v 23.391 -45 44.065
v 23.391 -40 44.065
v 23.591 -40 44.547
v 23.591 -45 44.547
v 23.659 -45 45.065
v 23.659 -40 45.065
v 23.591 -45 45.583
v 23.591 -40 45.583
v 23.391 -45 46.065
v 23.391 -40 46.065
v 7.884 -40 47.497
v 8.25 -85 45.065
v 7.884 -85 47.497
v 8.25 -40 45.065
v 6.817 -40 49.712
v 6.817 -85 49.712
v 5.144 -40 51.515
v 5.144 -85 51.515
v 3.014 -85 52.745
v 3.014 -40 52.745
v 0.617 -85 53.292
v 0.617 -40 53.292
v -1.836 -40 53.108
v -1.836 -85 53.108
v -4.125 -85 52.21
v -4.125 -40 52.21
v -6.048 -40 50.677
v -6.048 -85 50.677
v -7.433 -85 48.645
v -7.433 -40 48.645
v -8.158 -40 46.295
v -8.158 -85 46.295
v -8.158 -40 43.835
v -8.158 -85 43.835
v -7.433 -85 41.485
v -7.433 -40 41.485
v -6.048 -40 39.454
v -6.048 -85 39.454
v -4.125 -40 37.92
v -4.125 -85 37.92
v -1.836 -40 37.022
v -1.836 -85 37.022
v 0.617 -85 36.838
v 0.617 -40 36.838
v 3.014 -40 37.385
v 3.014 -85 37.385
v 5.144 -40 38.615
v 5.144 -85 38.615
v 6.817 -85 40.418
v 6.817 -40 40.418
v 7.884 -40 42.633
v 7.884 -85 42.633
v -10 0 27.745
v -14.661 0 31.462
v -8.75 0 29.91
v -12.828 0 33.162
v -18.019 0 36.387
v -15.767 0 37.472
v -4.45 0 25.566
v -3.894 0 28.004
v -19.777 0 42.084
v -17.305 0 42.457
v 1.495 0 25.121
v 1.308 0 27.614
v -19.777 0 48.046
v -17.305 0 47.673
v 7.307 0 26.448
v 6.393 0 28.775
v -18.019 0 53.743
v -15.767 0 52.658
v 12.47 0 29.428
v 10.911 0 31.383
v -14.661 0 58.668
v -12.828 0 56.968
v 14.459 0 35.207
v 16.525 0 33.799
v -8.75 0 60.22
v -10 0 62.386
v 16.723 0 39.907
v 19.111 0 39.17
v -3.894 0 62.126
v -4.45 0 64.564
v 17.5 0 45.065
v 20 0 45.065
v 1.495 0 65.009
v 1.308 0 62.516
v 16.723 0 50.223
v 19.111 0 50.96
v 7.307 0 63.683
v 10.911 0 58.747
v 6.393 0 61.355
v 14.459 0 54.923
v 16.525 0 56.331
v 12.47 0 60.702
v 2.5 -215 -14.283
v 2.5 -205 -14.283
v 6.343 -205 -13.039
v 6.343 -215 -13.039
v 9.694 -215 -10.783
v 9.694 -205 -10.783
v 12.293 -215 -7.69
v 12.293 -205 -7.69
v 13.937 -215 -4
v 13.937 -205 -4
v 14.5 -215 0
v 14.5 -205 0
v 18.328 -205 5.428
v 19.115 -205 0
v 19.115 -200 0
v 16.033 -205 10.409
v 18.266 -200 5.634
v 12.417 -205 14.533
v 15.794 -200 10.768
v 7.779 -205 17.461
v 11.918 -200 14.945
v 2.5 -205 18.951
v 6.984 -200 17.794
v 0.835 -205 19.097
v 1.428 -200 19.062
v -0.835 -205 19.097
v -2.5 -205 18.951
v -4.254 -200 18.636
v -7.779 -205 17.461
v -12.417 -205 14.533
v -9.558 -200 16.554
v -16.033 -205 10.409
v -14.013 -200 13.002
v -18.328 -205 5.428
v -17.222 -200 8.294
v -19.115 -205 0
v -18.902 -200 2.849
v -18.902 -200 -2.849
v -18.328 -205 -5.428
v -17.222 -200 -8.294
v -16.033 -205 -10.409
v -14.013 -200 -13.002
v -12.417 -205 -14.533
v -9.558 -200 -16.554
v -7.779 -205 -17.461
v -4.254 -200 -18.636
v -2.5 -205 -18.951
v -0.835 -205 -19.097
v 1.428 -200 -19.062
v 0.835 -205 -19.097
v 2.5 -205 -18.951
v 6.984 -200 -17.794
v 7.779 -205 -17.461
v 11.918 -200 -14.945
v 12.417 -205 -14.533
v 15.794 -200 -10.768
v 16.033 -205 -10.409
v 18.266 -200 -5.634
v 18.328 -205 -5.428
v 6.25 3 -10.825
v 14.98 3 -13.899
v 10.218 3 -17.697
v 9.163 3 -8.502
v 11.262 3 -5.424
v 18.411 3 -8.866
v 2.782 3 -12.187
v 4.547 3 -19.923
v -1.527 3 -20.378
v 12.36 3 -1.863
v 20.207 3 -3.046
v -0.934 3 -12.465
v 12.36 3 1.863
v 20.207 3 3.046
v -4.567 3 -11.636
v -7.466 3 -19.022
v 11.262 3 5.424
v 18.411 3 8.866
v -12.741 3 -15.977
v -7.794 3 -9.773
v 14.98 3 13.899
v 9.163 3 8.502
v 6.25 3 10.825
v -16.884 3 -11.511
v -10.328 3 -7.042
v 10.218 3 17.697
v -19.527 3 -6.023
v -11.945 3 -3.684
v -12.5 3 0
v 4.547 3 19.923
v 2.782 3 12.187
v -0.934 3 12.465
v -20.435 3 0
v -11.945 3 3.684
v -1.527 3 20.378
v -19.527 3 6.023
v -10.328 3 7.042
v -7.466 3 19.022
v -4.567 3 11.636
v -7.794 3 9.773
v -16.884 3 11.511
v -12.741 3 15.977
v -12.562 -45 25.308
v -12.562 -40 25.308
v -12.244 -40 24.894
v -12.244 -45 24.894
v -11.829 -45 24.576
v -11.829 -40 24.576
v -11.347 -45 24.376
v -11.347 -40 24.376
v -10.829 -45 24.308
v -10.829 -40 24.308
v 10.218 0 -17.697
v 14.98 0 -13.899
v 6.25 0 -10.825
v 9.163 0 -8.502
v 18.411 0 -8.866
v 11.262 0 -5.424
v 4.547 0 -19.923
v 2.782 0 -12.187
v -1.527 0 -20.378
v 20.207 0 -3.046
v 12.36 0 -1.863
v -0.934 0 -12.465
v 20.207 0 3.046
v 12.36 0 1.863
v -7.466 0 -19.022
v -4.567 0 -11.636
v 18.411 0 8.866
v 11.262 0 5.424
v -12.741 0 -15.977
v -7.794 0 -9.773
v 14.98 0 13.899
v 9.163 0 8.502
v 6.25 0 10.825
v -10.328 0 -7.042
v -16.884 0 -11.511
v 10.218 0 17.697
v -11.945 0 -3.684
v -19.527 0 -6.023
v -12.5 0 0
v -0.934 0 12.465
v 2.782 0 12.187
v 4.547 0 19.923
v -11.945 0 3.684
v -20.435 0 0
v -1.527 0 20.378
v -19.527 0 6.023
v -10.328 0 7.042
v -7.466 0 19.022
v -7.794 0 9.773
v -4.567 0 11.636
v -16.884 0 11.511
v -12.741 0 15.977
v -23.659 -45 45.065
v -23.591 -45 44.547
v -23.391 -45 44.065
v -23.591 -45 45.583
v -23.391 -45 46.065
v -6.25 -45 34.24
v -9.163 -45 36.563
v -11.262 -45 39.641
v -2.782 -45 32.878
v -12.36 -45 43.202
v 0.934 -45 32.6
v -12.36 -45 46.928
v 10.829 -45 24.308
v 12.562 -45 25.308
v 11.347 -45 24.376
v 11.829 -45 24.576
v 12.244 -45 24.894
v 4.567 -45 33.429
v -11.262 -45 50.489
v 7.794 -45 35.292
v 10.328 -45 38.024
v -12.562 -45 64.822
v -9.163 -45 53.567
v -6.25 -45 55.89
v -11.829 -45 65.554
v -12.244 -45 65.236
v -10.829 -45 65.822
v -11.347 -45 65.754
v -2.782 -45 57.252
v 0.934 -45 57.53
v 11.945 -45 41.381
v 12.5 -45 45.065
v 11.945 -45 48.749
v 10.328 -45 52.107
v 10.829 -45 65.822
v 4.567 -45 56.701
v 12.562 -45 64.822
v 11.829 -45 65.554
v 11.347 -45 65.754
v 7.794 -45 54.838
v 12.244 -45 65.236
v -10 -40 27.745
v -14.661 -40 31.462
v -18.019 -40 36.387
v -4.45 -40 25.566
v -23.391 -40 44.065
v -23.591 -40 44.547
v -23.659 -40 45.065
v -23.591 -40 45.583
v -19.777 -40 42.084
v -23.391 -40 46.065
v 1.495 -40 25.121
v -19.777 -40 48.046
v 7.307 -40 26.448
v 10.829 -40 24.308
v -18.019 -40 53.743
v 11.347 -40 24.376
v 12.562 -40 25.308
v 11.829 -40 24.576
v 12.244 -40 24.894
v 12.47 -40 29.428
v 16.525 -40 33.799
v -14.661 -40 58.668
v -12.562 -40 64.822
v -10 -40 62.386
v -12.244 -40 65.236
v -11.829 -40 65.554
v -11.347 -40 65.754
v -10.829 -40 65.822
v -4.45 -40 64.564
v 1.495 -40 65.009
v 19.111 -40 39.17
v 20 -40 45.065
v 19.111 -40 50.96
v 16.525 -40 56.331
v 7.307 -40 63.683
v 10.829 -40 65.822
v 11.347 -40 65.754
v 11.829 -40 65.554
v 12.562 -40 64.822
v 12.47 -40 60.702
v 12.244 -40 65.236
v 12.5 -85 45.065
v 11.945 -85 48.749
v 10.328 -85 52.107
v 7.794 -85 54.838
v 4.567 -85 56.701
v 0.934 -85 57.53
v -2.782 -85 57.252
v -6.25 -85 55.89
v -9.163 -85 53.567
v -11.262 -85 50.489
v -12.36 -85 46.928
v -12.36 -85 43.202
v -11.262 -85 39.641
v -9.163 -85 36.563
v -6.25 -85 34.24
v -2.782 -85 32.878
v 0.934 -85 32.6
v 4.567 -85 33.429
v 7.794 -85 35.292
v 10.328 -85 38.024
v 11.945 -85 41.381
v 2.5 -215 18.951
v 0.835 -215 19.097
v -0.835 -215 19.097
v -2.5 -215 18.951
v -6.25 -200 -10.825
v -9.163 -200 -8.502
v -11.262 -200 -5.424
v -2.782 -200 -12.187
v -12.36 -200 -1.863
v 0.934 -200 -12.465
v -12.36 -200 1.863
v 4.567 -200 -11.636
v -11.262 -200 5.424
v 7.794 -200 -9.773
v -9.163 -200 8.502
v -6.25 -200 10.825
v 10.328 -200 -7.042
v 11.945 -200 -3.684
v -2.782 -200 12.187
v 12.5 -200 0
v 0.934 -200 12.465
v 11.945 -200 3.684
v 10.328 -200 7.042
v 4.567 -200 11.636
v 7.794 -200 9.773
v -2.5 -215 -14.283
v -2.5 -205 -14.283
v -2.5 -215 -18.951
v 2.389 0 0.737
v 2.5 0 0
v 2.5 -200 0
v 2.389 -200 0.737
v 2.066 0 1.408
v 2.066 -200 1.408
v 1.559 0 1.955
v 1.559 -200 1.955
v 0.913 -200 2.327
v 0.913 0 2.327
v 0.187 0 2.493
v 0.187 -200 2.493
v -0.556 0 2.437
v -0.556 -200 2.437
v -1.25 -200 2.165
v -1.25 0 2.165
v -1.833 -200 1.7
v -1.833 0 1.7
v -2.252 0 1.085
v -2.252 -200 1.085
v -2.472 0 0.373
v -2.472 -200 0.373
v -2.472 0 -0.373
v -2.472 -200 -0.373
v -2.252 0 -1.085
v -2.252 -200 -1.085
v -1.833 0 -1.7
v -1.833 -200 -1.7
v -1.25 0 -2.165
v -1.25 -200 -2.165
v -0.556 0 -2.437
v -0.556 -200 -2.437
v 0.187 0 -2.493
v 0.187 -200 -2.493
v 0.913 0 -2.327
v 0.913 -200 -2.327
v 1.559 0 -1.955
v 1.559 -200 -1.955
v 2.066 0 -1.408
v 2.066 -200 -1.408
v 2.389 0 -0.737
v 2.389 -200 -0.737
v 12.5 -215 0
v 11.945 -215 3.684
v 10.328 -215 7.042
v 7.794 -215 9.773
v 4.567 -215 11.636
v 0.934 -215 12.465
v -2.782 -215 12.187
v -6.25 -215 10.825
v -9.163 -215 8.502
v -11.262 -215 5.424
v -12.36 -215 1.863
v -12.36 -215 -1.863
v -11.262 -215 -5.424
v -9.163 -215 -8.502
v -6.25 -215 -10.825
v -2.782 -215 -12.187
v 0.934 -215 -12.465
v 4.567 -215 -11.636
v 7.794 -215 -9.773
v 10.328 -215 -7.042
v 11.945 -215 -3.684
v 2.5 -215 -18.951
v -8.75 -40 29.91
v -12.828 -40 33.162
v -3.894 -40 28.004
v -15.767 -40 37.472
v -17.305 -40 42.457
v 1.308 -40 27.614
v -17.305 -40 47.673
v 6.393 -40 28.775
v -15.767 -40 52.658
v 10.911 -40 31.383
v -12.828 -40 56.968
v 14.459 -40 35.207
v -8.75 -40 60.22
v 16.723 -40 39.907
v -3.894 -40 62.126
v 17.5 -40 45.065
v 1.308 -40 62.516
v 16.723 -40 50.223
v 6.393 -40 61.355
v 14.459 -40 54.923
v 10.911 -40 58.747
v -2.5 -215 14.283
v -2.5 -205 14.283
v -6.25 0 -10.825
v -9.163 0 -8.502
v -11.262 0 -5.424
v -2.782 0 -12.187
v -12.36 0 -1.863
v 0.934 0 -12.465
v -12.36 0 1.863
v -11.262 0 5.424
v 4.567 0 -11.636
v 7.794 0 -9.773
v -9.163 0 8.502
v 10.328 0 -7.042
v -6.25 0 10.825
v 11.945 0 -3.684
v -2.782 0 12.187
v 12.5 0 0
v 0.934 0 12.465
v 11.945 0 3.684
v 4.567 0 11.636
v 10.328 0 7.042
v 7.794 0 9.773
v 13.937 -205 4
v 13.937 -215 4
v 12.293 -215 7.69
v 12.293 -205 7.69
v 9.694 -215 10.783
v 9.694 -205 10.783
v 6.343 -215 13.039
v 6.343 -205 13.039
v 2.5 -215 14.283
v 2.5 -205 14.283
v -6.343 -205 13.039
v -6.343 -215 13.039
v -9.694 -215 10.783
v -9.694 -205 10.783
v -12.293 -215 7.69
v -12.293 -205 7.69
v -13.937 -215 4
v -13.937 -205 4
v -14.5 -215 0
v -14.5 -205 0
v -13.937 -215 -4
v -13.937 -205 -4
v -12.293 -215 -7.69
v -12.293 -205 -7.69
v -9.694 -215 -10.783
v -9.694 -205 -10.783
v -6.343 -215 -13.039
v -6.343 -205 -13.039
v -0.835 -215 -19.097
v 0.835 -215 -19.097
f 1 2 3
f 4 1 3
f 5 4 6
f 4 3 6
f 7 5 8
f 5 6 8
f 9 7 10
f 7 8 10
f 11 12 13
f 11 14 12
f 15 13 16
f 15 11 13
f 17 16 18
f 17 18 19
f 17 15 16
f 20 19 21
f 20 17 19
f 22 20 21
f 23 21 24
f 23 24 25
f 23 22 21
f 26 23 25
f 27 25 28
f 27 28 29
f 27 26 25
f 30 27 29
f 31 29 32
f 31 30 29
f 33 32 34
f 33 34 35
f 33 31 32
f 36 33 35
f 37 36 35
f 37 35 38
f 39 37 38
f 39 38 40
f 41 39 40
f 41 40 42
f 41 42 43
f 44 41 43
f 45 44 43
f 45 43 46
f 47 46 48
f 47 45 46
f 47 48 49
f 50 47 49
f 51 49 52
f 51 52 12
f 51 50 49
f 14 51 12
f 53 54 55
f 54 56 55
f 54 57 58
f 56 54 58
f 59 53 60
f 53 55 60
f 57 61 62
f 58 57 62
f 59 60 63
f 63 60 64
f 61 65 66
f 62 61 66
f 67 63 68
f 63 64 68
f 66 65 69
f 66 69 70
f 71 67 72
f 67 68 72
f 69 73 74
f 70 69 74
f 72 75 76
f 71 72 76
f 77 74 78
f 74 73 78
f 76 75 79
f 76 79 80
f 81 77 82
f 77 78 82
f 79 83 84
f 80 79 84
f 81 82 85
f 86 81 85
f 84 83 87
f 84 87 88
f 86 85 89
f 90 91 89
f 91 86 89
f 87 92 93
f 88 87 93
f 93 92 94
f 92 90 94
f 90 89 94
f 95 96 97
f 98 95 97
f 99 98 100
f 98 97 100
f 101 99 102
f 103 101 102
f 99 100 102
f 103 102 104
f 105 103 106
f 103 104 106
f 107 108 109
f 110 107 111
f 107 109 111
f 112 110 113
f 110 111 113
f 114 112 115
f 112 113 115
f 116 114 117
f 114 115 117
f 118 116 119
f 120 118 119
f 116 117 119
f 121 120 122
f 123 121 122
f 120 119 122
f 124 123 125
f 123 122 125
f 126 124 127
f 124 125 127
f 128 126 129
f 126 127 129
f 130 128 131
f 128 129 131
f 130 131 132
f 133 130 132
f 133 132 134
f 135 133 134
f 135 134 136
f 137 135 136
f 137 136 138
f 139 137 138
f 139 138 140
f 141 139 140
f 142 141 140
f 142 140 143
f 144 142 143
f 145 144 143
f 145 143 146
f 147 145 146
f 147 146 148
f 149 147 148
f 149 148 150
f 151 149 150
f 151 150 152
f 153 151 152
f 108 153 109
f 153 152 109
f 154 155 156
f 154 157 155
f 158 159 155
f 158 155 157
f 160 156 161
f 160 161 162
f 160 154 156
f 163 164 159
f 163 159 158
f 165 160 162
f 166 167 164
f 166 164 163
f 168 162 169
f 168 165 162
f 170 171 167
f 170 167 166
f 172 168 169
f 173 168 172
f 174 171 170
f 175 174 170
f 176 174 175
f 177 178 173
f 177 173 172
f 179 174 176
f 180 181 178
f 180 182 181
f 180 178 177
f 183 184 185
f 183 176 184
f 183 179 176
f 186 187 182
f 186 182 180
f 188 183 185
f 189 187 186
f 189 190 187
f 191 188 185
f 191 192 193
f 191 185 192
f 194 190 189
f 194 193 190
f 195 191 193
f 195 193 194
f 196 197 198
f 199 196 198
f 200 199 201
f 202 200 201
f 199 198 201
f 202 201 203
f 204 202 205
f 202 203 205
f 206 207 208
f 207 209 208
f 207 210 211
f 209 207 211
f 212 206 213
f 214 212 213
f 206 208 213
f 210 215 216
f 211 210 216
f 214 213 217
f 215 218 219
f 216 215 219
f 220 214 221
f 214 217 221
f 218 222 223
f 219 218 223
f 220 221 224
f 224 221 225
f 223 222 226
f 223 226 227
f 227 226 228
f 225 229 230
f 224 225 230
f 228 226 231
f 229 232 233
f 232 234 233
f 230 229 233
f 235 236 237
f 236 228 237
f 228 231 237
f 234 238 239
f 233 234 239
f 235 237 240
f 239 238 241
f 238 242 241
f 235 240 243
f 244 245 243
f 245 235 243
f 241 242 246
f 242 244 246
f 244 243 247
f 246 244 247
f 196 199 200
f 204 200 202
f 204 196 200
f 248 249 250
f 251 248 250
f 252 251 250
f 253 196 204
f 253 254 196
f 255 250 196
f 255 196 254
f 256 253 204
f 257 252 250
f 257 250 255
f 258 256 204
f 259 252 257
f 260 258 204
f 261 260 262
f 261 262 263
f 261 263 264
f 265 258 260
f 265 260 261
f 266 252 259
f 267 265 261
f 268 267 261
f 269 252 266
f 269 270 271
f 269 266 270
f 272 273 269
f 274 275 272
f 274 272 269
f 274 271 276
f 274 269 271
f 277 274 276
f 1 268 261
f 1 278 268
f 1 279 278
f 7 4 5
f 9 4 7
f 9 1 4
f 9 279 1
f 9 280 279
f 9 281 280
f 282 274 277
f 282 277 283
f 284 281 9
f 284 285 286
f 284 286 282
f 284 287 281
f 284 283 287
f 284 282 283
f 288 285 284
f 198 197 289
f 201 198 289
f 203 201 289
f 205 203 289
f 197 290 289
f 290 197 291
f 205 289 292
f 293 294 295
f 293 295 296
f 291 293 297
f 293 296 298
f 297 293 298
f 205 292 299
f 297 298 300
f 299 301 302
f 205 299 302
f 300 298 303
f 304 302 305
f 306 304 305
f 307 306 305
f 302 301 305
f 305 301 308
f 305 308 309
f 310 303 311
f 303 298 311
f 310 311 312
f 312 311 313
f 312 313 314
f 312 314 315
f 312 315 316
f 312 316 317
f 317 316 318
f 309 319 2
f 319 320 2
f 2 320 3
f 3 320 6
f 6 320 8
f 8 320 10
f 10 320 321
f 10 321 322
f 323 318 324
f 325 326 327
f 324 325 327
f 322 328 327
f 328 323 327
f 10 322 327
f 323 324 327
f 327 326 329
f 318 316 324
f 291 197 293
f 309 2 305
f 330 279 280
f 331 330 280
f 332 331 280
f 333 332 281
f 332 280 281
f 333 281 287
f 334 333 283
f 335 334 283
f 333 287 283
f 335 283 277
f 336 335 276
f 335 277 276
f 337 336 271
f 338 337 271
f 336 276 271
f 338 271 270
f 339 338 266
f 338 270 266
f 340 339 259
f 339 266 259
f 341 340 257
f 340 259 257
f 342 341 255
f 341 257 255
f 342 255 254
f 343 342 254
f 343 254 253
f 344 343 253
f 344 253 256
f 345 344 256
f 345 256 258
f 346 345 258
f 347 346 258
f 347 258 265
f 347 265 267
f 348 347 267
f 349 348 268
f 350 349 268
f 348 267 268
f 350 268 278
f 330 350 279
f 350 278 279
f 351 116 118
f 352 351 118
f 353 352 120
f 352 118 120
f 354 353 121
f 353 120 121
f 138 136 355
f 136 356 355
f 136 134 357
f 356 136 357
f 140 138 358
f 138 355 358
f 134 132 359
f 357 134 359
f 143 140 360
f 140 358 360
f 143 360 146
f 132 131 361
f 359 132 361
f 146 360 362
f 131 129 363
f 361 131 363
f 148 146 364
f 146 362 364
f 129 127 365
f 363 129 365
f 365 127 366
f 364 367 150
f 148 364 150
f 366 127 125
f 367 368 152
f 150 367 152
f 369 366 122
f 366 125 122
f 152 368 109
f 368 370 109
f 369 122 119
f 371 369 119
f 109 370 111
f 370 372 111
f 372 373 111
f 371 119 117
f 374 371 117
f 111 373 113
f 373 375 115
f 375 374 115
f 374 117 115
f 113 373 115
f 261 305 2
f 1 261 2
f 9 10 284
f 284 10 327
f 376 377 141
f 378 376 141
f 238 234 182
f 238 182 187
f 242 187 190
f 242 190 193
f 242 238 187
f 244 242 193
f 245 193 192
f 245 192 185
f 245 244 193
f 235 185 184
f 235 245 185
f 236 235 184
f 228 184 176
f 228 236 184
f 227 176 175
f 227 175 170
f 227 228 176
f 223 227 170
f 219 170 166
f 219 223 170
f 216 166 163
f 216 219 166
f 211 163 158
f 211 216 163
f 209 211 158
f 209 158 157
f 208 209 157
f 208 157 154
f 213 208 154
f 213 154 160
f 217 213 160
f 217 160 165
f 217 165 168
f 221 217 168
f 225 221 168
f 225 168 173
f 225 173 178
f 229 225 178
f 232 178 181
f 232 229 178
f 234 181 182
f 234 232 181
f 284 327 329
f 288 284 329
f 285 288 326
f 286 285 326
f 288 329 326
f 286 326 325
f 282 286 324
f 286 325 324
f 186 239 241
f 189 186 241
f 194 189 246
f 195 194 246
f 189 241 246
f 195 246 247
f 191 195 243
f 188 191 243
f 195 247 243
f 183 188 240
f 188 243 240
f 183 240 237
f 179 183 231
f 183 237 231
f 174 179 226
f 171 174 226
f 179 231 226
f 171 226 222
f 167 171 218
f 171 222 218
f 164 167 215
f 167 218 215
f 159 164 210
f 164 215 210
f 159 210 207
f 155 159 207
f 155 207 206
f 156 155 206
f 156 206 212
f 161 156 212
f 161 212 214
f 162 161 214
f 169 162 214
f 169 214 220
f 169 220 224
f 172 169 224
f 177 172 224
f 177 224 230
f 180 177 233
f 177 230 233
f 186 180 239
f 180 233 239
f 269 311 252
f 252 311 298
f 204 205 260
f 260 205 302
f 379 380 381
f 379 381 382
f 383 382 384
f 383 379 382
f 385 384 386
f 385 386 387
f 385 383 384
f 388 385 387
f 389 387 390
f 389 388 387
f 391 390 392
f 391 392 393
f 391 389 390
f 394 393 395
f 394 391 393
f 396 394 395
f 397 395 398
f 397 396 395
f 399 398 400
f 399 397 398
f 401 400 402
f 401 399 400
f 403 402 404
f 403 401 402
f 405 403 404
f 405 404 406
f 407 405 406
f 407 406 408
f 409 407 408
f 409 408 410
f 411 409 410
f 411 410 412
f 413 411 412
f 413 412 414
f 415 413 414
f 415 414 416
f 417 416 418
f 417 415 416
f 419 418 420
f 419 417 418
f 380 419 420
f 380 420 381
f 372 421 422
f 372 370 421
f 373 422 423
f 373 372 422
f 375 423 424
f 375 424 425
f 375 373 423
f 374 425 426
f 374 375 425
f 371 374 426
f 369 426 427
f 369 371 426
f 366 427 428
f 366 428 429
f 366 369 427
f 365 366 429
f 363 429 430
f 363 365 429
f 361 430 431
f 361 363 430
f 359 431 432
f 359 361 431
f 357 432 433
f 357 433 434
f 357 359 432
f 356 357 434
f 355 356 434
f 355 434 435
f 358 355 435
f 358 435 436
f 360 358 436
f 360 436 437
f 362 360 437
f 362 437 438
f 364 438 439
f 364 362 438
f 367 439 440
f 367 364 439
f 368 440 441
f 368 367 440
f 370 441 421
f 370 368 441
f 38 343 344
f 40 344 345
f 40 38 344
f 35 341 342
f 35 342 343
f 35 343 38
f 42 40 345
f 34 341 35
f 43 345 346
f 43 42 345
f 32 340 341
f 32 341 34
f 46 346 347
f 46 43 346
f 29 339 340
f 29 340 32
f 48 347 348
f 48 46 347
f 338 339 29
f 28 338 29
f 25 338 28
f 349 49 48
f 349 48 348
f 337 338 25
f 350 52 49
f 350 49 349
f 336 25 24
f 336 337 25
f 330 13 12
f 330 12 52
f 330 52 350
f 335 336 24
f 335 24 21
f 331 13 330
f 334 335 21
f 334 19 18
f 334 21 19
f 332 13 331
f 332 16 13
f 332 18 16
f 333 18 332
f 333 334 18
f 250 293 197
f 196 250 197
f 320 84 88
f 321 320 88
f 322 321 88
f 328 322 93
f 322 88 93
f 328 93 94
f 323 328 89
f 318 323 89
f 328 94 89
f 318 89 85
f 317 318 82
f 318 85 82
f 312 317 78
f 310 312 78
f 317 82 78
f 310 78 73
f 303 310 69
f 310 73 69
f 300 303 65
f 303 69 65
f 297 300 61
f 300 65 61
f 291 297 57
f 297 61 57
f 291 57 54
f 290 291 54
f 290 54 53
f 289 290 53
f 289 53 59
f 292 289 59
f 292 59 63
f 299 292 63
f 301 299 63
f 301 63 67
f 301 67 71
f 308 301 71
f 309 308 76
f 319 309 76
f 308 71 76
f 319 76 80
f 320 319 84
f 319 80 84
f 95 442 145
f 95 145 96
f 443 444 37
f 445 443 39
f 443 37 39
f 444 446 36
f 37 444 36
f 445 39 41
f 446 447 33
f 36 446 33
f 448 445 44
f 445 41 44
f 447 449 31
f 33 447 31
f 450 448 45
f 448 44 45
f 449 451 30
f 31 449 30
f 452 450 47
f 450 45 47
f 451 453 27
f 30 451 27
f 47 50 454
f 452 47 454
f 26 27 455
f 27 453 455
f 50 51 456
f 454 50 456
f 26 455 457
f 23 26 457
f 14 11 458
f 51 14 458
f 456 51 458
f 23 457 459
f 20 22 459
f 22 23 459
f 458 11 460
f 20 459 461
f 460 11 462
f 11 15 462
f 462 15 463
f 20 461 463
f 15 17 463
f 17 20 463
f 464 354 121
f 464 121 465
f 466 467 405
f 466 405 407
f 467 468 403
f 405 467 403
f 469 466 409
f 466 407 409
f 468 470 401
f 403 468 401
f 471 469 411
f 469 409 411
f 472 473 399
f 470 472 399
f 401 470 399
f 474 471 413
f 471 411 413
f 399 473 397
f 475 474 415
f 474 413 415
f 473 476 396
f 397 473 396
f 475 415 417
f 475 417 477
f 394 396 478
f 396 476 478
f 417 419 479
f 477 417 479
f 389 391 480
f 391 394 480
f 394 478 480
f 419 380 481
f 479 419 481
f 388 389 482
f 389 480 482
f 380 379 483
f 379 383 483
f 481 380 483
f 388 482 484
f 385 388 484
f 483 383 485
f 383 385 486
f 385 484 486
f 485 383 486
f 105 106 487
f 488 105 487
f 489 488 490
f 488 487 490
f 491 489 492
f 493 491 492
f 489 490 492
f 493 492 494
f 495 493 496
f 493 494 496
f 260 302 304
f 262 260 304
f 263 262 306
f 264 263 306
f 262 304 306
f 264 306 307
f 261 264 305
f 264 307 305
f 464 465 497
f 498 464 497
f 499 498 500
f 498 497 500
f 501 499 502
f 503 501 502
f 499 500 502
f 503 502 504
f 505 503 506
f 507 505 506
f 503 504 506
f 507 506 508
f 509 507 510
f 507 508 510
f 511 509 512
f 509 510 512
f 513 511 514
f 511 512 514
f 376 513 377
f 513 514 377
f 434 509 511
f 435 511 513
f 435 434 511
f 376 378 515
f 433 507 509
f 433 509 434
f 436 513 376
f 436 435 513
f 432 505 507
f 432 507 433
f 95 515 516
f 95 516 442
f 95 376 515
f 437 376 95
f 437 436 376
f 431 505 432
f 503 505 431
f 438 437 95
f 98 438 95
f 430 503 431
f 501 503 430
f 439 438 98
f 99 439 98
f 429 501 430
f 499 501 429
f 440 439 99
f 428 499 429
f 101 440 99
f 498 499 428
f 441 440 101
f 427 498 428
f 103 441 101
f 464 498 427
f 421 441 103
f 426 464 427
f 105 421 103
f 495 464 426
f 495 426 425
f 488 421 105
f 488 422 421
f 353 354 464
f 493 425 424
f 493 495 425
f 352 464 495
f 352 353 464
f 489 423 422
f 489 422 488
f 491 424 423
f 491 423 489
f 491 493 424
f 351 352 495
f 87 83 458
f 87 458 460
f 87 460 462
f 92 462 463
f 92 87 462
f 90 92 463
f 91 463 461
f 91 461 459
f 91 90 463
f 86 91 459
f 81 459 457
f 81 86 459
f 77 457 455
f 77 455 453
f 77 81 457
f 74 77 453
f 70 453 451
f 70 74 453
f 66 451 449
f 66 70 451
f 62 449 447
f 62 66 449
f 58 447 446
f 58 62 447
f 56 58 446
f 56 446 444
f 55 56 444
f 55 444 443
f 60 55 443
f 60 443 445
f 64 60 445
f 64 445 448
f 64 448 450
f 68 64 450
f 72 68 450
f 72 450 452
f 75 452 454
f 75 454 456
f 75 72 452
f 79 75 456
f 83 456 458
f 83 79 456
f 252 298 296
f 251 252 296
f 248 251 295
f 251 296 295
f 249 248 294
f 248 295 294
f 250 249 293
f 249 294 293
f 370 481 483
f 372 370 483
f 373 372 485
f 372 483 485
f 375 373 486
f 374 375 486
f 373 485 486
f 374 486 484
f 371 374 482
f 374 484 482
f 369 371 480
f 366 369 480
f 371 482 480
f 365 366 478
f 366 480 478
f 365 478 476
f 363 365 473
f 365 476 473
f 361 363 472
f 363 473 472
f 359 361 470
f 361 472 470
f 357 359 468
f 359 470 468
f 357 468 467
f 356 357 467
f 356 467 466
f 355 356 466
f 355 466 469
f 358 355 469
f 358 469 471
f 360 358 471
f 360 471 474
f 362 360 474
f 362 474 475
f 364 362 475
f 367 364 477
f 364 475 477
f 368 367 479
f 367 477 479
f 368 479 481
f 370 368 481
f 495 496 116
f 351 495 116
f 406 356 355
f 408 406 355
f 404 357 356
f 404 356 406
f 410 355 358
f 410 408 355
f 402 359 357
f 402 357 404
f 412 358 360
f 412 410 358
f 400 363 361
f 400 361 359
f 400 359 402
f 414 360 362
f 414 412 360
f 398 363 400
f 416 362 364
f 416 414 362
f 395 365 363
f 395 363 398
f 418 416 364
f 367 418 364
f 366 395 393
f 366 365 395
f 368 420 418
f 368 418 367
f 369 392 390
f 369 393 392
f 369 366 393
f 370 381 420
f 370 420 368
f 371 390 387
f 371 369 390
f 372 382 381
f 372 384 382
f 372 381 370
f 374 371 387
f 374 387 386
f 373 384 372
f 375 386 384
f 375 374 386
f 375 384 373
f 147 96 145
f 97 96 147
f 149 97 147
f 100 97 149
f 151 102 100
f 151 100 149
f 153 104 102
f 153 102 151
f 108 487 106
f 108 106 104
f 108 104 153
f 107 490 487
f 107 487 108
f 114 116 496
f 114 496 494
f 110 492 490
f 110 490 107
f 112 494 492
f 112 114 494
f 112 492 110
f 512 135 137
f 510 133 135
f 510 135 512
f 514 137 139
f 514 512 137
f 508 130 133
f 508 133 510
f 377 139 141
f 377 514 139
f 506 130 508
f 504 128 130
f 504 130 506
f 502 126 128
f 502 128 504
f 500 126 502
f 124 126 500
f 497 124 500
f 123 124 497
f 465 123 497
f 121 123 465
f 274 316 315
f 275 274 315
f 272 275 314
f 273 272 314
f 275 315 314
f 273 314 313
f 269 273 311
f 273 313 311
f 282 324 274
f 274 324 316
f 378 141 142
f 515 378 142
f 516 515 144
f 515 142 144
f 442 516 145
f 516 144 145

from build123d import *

# Parameters (mm, degrees)
F0_R      = 12.5
F0_R_2    = 2.5
F1_DEPTH  = 200
F2_R      = 19.115364
F2_R_2    = 12.5
F3_DEPTH  = 5
F4_R      = 12.5
F5_DEPTH  = 10
F6_R      = 20
F6_R_2    = 17.5
F7_DEPTH  = 40
F8_R      = 8.250091
F9_DEPTH  = 5
F10_R     = 12.5
F10_R_2   = 8.250091
F11_DEPTH = 40
F12_R     = 20.435005
F12_R_2   = 12.5
F13_DEPTH = 3


with BuildPart() as f1:
    # F0 (on Front) → F1 (new body)
    with BuildSketch(Plane.XZ):
        Circle(F0_R)
        Circle(F0_R_2, mode=Mode.SUBTRACT)
    extrude(amount=F1_DEPTH)


with BuildPart() as f3:
    # F2 (on face) → F3 (new body)
    with BuildSketch(Plane.XZ.offset(200)):
        Circle(F2_R)
        Circle(F2_R_2, mode=Mode.SUBTRACT)
    extrude(amount=F3_DEPTH)

    # F4 (on face) → F5 (join)
    with BuildSketch(Plane.XZ.offset(205)):
        with BuildLine():
            Line((2.5, 14.282857), (2.5, 18.951178))
            ThreePointArc((2.5, 18.951178), (0, 19.115364), (-2.5, 18.951178))
            Line((-2.5, 18.951178), (-2.5, 14.282857))
            ThreePointArc((-2.5, 14.282857), (0, 14.5), (2.5, 14.282857))
        make_face()
        with BuildLine():
            ThreePointArc((-2.5, -18.951178), (0, -19.115364), (2.5, -18.951178))
            Line((2.5, -18.951178), (2.5, -14.282857))
            ThreePointArc((2.5, -14.282857), (0, -14.5), (-2.5, -14.282857))
            Line((-2.5, -14.282857), (-2.5, -18.951178))
        make_face()
        with BuildLine():
            ThreePointArc((14.5, 0), (11.101802, 9.327379), (2.5, 14.282857))
            ThreePointArc((2.5, 14.282857), (0, 14.5), (-2.5, 14.282857))
            ThreePointArc((-2.5, 14.282857), (-14.5, 0), (-2.5, -14.282857))
            ThreePointArc((-2.5, -14.282857), (0, -14.5), (2.5, -14.282857))
            ThreePointArc((2.5, -14.282857), (11.101802, -9.327379), (14.5, 0))
        make_face()
        Circle(F4_R, mode=Mode.SUBTRACT)
    extrude(amount=F5_DEPTH)


with BuildPart() as f7:
    # F6 (on Front) → F7 (new body)
    with BuildSketch(Plane.XZ):
        with Locations((0, 45.065034)):
            Circle(F6_R)
        with Locations((0, 45.065034)):
            Circle(F6_R_2, mode=Mode.SUBTRACT)
    extrude(amount=F7_DEPTH)

    # F8 (on face) → F9 (join)
    with BuildSketch(Plane.XZ.offset(40)):
        with BuildLine():
            Line((10.829489, 65.822259), (-10.829489, 65.822259))
            ThreePointArc((-10.829489, 65.822259), (-11.829489, 65.554309), (-12.561539, 64.822259))
            Line((-12.561539, 64.822259), (-23.391028, 46.065034))
            ThreePointArc((-23.391028, 46.065034), (-23.658977, 45.065034), (-23.391028, 44.065034))
            Line((-23.391028, 44.065034), (-12.561539, 25.30781))
            ThreePointArc((-12.561539, 25.30781), (-11.829489, 24.575759), (-10.829489, 24.30781))
            Line((-10.829489, 24.30781), (10.829489, 24.30781))
            ThreePointArc((10.829489, 24.30781), (11.829489, 24.575759), (12.561539, 25.30781))
            Line((12.561539, 25.30781), (23.391028, 44.065034))
            ThreePointArc((23.391028, 44.065034), (23.658977, 45.065034), (23.391028, 46.065034))
            Line((23.391028, 46.065034), (12.561539, 64.822259))
            ThreePointArc((12.561539, 64.822259), (11.829489, 65.554309), (10.829489, 65.822259))
        make_face()
        with Locations((0, 45.065034)):
            Circle(F8_R, mode=Mode.SUBTRACT)
    extrude(amount=F9_DEPTH)

    # F10 (on face) → F11 (join)
    with BuildSketch(Plane.XZ.offset(45)):
        with Locations((0, 45.065034)):
            Circle(F10_R)
        with Locations((0, 45.065034)):
            Circle(F10_R_2, mode=Mode.SUBTRACT)
    extrude(amount=F11_DEPTH)


with BuildPart() as f13:
    # F12 (on face) → F13 (new body)
    with BuildSketch(Plane(origin=(0, 0, 0), x_dir=(-1, 0, 0), z_dir=(0, 1, 0))):
        Circle(F12_R)
        Circle(F12_R_2, mode=Mode.SUBTRACT)
    extrude(amount=F13_DEPTH)


solid = Compound([f1.part, f3.part, f7.part, f13.part])
